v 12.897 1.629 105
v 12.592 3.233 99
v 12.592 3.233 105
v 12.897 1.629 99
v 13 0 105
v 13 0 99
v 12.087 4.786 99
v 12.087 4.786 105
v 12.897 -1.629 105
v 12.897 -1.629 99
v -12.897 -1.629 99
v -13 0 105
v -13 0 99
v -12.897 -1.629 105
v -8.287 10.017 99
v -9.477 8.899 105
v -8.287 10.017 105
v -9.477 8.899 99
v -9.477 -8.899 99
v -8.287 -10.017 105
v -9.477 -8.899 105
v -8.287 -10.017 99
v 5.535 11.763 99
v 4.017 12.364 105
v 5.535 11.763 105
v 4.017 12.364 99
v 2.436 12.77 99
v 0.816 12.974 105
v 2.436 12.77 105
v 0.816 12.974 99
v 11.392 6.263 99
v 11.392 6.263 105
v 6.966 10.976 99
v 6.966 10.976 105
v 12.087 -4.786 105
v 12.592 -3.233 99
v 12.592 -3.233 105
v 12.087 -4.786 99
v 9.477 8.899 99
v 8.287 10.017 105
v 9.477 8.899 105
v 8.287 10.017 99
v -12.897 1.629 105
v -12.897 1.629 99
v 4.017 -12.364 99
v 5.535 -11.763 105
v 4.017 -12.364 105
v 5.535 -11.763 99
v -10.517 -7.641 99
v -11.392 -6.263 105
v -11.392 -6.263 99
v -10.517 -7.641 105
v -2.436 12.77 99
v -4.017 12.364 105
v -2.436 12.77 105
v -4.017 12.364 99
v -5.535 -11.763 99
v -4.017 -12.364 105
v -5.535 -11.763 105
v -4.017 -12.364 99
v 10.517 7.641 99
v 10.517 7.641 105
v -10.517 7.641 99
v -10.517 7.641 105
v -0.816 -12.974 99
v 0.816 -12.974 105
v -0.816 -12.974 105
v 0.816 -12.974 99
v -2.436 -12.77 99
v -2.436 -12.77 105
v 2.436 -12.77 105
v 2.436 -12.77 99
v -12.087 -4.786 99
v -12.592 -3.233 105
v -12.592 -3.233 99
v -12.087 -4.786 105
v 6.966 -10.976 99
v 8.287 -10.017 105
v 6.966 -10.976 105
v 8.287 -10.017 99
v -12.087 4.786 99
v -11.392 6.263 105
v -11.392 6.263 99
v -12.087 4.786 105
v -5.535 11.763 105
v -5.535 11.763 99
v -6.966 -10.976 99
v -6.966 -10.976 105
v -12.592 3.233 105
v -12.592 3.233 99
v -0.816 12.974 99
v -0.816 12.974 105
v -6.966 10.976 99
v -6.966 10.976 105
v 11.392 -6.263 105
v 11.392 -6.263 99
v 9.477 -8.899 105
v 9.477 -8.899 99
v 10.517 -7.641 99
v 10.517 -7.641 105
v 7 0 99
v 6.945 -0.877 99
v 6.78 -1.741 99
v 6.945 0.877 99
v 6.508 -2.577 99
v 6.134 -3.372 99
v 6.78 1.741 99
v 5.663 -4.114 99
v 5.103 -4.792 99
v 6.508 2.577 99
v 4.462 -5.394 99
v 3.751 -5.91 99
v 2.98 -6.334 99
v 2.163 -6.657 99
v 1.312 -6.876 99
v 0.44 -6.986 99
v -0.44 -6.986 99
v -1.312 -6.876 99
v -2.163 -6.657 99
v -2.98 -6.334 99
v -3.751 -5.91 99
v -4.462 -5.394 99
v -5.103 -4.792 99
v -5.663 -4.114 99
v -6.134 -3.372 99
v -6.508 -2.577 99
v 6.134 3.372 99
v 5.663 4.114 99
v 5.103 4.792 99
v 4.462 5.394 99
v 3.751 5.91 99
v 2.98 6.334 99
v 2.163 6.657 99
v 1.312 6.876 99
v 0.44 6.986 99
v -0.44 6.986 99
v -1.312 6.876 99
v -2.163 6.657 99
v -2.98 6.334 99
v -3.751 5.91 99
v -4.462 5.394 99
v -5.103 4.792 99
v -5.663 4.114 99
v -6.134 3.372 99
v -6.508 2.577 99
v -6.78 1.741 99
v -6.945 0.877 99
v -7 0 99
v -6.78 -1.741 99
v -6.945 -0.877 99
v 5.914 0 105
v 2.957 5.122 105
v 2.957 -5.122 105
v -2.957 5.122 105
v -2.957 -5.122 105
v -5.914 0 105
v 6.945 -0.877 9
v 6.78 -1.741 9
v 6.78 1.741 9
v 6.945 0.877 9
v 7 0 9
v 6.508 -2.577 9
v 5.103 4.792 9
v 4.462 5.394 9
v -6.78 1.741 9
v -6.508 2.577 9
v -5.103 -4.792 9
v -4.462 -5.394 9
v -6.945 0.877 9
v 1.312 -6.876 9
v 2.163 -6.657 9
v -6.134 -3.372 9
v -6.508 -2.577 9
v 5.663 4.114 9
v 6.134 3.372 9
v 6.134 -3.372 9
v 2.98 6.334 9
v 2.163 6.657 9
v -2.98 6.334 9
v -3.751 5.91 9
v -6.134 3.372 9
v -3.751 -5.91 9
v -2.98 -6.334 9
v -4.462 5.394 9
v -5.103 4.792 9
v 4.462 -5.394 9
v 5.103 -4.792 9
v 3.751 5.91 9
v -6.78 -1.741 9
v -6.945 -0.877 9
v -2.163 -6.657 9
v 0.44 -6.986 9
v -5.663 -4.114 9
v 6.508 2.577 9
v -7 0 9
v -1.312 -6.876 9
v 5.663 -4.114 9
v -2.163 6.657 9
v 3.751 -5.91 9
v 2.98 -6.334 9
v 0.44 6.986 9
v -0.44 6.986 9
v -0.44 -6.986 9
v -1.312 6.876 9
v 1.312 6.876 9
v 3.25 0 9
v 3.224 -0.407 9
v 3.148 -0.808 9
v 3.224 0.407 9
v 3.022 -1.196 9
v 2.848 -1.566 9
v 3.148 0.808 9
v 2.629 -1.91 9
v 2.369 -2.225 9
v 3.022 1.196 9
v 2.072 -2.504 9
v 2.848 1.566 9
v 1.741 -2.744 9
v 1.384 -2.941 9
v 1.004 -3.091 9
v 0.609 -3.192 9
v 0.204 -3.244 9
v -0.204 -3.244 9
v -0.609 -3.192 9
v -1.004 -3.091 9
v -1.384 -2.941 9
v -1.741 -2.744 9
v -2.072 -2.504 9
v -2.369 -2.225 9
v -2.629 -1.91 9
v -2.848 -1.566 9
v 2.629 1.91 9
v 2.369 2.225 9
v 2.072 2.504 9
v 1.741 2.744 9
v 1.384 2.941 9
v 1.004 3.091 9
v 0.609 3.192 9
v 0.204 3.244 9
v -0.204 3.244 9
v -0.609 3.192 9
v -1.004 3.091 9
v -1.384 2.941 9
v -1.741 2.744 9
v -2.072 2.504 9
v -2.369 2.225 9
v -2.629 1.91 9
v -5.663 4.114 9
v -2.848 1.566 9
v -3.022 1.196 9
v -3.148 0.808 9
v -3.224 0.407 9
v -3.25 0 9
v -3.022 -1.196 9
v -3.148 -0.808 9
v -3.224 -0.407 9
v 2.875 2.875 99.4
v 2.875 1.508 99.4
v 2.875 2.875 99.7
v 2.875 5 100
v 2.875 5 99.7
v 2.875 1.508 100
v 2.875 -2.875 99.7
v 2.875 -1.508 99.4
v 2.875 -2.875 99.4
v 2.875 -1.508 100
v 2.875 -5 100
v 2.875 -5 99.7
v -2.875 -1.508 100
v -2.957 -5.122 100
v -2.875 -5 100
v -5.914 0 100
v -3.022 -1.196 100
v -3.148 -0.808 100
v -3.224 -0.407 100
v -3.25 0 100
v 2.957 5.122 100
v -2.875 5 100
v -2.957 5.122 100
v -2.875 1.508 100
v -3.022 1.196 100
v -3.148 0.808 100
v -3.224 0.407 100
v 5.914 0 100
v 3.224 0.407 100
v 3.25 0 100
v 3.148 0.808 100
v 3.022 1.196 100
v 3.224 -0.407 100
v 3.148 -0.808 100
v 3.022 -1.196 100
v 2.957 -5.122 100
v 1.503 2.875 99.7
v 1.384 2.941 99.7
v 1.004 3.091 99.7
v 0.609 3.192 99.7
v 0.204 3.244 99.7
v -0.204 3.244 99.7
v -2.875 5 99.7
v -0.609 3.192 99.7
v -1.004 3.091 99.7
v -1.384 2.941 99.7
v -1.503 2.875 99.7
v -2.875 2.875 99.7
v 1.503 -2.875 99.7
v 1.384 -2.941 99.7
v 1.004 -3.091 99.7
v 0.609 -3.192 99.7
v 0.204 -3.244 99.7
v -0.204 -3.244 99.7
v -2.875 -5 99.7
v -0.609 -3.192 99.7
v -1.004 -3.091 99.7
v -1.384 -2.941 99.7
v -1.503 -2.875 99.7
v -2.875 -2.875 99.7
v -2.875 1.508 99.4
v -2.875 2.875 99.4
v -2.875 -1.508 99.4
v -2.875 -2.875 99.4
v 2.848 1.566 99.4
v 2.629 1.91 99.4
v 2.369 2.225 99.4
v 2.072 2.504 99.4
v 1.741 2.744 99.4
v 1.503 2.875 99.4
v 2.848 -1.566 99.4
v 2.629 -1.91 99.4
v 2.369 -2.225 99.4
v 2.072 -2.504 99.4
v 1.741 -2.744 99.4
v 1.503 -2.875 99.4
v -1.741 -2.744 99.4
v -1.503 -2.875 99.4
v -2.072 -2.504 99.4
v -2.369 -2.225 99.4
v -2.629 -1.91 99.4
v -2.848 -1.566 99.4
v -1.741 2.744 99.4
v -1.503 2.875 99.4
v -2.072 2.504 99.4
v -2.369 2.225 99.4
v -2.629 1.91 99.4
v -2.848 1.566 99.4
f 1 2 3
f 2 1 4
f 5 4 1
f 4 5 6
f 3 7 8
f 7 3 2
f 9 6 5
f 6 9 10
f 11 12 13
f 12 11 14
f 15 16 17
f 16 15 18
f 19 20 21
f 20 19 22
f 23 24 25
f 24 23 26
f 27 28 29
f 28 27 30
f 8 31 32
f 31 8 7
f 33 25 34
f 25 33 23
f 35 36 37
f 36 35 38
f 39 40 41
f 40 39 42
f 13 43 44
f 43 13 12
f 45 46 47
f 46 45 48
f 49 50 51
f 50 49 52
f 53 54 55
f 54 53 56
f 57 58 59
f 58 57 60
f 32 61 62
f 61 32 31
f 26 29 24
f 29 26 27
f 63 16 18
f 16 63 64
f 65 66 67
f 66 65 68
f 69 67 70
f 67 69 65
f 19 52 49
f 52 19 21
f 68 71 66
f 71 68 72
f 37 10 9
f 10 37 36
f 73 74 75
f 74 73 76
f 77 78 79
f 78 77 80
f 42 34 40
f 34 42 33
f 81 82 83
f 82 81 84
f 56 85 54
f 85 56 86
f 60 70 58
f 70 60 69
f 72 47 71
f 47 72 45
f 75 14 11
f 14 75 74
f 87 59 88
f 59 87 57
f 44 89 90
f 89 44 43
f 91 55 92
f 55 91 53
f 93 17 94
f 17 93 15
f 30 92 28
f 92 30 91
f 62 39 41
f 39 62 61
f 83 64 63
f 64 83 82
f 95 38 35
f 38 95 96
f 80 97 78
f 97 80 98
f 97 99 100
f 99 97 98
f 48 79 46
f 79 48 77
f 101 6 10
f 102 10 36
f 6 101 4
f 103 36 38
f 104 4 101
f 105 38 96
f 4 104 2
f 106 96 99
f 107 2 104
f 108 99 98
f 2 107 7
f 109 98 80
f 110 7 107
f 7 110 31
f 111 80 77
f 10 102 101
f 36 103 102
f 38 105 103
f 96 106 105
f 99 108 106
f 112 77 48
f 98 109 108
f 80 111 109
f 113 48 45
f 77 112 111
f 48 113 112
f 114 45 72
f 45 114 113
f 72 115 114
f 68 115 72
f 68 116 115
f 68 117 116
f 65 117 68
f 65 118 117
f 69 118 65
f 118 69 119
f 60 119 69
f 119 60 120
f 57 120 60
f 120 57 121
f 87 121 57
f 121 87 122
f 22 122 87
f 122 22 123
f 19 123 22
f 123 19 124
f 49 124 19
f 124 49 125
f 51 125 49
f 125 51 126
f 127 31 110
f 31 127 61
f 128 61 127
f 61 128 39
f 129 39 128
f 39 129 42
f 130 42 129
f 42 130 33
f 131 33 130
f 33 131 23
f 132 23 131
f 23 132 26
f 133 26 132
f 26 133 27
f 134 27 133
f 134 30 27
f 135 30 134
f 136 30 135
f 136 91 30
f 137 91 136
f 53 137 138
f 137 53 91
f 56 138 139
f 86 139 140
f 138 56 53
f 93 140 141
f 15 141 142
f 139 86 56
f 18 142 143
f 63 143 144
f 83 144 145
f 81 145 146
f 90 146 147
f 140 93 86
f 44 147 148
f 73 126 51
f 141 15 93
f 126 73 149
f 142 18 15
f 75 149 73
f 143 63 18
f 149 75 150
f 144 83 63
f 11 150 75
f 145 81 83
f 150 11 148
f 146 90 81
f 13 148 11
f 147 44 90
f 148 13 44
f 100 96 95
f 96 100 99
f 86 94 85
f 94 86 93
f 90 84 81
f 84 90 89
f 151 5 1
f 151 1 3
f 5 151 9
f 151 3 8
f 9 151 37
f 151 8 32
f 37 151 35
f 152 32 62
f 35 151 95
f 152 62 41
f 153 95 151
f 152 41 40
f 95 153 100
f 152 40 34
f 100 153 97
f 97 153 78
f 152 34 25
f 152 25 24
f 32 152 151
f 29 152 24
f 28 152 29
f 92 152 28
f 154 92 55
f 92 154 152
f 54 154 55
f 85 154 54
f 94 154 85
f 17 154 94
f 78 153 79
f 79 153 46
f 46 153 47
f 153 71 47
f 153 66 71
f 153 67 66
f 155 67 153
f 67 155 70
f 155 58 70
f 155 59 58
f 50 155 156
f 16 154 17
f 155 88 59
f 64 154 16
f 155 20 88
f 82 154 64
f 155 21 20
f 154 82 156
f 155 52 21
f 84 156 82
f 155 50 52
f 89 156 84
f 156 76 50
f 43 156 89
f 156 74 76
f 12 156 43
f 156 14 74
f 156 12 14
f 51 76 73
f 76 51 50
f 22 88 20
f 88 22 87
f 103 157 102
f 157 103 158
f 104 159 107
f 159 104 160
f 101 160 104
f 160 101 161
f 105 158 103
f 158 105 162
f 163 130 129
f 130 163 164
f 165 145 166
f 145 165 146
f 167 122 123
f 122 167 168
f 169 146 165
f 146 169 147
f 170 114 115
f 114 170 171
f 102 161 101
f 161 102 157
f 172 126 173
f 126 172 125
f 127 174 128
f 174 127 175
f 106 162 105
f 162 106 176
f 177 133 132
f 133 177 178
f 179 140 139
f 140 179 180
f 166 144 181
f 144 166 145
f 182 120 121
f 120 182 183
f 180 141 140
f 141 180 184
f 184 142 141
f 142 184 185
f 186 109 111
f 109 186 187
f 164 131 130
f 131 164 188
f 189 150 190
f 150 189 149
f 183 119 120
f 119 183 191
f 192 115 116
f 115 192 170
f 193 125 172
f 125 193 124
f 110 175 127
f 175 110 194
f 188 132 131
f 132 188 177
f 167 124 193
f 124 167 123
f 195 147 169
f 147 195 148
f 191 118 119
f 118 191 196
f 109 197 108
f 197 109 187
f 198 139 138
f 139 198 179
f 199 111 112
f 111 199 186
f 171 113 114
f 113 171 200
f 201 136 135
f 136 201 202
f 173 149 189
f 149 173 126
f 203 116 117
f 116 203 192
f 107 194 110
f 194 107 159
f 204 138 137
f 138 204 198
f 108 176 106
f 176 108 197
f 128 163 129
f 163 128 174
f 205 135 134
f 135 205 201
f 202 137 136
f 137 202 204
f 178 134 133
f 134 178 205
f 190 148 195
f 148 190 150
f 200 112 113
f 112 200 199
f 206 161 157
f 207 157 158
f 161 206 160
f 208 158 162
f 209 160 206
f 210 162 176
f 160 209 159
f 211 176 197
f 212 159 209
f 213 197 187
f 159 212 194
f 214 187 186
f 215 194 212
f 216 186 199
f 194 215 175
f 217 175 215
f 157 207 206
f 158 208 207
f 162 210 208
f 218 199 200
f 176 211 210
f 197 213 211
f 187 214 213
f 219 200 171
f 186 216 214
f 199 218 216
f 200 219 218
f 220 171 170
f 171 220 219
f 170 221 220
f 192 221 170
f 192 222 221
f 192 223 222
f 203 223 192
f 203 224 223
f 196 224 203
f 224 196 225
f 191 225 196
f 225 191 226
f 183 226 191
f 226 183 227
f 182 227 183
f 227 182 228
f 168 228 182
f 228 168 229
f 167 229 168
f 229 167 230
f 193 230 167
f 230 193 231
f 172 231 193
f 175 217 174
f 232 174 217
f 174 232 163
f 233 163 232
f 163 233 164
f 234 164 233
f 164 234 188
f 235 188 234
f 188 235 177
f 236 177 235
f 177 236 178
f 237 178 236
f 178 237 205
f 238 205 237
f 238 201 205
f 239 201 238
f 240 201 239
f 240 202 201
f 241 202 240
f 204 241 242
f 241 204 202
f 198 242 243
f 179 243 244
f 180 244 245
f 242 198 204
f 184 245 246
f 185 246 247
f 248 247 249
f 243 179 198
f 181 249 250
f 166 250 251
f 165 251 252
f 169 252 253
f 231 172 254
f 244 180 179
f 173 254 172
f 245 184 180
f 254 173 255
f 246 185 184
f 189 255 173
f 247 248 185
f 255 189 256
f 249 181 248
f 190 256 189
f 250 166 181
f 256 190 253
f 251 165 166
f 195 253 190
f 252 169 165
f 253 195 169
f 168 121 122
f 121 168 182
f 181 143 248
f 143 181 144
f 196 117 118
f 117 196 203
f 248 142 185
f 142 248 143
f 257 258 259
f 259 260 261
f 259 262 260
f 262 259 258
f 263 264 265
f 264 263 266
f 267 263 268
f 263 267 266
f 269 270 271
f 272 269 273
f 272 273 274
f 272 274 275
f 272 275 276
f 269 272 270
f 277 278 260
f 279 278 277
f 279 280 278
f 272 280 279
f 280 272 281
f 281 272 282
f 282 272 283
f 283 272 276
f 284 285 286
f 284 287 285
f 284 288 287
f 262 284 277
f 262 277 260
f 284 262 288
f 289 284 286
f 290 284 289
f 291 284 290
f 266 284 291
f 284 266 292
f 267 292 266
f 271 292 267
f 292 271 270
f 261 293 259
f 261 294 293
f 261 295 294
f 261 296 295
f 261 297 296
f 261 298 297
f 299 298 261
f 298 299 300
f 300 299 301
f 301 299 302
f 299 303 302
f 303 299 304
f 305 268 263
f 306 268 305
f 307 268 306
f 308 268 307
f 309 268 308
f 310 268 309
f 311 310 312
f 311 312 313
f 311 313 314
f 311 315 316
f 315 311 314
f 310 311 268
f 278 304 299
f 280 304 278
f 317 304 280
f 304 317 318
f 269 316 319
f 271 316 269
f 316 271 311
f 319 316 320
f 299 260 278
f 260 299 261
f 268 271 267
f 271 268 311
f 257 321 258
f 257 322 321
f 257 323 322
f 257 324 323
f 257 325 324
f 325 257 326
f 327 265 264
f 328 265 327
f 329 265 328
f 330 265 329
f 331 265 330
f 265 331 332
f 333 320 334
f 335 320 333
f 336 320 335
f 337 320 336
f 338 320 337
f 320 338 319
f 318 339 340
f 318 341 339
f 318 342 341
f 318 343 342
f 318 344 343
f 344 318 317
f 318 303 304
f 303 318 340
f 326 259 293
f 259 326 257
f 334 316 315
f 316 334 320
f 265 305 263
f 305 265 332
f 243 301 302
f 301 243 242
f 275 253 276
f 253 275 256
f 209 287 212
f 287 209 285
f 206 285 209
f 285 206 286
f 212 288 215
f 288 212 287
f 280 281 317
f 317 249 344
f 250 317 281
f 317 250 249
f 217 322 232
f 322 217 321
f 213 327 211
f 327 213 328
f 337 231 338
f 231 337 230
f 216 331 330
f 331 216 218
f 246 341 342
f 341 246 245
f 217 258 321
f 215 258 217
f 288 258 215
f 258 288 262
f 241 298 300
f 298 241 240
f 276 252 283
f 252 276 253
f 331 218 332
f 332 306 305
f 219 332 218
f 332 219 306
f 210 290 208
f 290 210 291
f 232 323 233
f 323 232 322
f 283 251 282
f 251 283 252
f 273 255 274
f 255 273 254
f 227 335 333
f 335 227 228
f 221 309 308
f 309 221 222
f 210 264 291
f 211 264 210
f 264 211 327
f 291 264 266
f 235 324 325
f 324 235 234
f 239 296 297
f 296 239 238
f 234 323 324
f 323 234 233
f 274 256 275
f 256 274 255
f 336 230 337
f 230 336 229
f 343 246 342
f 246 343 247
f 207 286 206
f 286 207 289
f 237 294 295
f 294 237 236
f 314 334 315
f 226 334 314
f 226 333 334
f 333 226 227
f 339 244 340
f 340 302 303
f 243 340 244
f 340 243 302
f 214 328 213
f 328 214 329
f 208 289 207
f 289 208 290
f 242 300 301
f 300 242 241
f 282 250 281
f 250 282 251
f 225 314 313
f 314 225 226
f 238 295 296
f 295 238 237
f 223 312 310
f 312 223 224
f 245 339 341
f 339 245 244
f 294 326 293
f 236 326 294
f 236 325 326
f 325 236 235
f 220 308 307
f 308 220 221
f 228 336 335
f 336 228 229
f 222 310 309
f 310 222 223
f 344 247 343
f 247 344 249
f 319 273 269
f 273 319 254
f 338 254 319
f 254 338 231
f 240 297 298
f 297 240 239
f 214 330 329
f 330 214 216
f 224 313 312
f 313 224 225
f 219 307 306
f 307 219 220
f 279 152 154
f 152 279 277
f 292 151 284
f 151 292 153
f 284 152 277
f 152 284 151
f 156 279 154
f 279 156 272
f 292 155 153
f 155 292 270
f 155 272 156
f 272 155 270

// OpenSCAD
$fn = 50;


difference() {
	union() {
		translate(v = [0, 0, 99.0000000000]) {
			cylinder(h = 6, r = 13.0000000000);
		}
		translate(v = [0, 0, 9.0000000000]) {
			cylinder(h = 96, r = 7.0000000000);
		}
	}
	union() {
		translate(v = [0, 0, 105]) {
			rotate(a = [0, 0, 0]) {
				difference() {
					union() {
						#translate(v = [-2.8750000000, -5.0000000000, -5.3000000000]) {
							cube(size = [5.7500000000, 10, 0.3000000000]);
						}
						#translate(v = [-2.8750000000, -2.8750000000, -5.6000000000]) {
							cube(size = [5.7500000000, 5.7500000000, 0.3000000000]);
						}
						#translate(v = [-2.8750000000, -5.0000000000, 0]) {
							cube(size = [5.7500000000, 10, 0.3000000000]);
						}
						#translate(v = [-2.8750000000, -2.8750000000, 0.3000000000]) {
							cube(size = [5.7500000000, 5.7500000000, 0.3000000000]);
						}
						#translate(v = [0, 0, -100.0000000000]) {
							cylinder(h = 200, r = 3.2500000000);
						}
						translate(v = [0, 0, -5]) {
							#linear_extrude(height = 5) {
								polygon(points = [[5.9142500000, 0.0000000000], [2.9571250000, 5.1218907443], [-2.9571250000, 5.1218907443], [-5.9142500000, 0.0000000000], [-2.9571250000, -5.1218907443], [2.9571250000, -5.1218907443]]);
							}
						}
						#translate(v = [-2.8750000000, -5.0000000000, -5.3000000000]) {
							cube(size = [5.7500000000, 10, 0.3000000000]);
						}
						#translate(v = [-2.8750000000, -2.8750000000, -5.6000000000]) {
							cube(size = [5.7500000000, 5.7500000000, 0.3000000000]);
						}
						#translate(v = [-2.8750000000, -5.0000000000, 0]) {
							cube(size = [5.7500000000, 10, 0.3000000000]);
						}
						#translate(v = [-2.8750000000, -2.8750000000, 0.3000000000]) {
							cube(size = [5.7500000000, 5.7500000000, 0.3000000000]);
						}
						#translate(v = [0, 0, -100.0000000000]) {
							cylinder(h = 200, r = 3.2500000000);
						}
						#translate(v = [-2.8750000000, -5.0000000000, -5.3000000000]) {
							cube(size = [5.7500000000, 10, 0.3000000000]);
						}
						#translate(v = [-2.8750000000, -2.8750000000, -5.6000000000]) {
							cube(size = [5.7500000000, 5.7500000000, 0.3000000000]);
						}
						#translate(v = [-2.8750000000, -5.0000000000, 0]) {
							cube(size = [5.7500000000, 10, 0.3000000000]);
						}
						#translate(v = [-2.8750000000, -2.8750000000, 0.3000000000]) {
							cube(size = [5.7500000000, 5.7500000000, 0.3000000000]);
						}
						#translate(v = [0, 0, -100.0000000000]) {
							cylinder(h = 200, r = 3.2500000000);
						}
					}
					union();
				}
			}
		}
		#translate(v = [0, 0, -100.0000000000]) {
			cylinder(h = 200, r = 3.2500000000);
		}
	}
}
